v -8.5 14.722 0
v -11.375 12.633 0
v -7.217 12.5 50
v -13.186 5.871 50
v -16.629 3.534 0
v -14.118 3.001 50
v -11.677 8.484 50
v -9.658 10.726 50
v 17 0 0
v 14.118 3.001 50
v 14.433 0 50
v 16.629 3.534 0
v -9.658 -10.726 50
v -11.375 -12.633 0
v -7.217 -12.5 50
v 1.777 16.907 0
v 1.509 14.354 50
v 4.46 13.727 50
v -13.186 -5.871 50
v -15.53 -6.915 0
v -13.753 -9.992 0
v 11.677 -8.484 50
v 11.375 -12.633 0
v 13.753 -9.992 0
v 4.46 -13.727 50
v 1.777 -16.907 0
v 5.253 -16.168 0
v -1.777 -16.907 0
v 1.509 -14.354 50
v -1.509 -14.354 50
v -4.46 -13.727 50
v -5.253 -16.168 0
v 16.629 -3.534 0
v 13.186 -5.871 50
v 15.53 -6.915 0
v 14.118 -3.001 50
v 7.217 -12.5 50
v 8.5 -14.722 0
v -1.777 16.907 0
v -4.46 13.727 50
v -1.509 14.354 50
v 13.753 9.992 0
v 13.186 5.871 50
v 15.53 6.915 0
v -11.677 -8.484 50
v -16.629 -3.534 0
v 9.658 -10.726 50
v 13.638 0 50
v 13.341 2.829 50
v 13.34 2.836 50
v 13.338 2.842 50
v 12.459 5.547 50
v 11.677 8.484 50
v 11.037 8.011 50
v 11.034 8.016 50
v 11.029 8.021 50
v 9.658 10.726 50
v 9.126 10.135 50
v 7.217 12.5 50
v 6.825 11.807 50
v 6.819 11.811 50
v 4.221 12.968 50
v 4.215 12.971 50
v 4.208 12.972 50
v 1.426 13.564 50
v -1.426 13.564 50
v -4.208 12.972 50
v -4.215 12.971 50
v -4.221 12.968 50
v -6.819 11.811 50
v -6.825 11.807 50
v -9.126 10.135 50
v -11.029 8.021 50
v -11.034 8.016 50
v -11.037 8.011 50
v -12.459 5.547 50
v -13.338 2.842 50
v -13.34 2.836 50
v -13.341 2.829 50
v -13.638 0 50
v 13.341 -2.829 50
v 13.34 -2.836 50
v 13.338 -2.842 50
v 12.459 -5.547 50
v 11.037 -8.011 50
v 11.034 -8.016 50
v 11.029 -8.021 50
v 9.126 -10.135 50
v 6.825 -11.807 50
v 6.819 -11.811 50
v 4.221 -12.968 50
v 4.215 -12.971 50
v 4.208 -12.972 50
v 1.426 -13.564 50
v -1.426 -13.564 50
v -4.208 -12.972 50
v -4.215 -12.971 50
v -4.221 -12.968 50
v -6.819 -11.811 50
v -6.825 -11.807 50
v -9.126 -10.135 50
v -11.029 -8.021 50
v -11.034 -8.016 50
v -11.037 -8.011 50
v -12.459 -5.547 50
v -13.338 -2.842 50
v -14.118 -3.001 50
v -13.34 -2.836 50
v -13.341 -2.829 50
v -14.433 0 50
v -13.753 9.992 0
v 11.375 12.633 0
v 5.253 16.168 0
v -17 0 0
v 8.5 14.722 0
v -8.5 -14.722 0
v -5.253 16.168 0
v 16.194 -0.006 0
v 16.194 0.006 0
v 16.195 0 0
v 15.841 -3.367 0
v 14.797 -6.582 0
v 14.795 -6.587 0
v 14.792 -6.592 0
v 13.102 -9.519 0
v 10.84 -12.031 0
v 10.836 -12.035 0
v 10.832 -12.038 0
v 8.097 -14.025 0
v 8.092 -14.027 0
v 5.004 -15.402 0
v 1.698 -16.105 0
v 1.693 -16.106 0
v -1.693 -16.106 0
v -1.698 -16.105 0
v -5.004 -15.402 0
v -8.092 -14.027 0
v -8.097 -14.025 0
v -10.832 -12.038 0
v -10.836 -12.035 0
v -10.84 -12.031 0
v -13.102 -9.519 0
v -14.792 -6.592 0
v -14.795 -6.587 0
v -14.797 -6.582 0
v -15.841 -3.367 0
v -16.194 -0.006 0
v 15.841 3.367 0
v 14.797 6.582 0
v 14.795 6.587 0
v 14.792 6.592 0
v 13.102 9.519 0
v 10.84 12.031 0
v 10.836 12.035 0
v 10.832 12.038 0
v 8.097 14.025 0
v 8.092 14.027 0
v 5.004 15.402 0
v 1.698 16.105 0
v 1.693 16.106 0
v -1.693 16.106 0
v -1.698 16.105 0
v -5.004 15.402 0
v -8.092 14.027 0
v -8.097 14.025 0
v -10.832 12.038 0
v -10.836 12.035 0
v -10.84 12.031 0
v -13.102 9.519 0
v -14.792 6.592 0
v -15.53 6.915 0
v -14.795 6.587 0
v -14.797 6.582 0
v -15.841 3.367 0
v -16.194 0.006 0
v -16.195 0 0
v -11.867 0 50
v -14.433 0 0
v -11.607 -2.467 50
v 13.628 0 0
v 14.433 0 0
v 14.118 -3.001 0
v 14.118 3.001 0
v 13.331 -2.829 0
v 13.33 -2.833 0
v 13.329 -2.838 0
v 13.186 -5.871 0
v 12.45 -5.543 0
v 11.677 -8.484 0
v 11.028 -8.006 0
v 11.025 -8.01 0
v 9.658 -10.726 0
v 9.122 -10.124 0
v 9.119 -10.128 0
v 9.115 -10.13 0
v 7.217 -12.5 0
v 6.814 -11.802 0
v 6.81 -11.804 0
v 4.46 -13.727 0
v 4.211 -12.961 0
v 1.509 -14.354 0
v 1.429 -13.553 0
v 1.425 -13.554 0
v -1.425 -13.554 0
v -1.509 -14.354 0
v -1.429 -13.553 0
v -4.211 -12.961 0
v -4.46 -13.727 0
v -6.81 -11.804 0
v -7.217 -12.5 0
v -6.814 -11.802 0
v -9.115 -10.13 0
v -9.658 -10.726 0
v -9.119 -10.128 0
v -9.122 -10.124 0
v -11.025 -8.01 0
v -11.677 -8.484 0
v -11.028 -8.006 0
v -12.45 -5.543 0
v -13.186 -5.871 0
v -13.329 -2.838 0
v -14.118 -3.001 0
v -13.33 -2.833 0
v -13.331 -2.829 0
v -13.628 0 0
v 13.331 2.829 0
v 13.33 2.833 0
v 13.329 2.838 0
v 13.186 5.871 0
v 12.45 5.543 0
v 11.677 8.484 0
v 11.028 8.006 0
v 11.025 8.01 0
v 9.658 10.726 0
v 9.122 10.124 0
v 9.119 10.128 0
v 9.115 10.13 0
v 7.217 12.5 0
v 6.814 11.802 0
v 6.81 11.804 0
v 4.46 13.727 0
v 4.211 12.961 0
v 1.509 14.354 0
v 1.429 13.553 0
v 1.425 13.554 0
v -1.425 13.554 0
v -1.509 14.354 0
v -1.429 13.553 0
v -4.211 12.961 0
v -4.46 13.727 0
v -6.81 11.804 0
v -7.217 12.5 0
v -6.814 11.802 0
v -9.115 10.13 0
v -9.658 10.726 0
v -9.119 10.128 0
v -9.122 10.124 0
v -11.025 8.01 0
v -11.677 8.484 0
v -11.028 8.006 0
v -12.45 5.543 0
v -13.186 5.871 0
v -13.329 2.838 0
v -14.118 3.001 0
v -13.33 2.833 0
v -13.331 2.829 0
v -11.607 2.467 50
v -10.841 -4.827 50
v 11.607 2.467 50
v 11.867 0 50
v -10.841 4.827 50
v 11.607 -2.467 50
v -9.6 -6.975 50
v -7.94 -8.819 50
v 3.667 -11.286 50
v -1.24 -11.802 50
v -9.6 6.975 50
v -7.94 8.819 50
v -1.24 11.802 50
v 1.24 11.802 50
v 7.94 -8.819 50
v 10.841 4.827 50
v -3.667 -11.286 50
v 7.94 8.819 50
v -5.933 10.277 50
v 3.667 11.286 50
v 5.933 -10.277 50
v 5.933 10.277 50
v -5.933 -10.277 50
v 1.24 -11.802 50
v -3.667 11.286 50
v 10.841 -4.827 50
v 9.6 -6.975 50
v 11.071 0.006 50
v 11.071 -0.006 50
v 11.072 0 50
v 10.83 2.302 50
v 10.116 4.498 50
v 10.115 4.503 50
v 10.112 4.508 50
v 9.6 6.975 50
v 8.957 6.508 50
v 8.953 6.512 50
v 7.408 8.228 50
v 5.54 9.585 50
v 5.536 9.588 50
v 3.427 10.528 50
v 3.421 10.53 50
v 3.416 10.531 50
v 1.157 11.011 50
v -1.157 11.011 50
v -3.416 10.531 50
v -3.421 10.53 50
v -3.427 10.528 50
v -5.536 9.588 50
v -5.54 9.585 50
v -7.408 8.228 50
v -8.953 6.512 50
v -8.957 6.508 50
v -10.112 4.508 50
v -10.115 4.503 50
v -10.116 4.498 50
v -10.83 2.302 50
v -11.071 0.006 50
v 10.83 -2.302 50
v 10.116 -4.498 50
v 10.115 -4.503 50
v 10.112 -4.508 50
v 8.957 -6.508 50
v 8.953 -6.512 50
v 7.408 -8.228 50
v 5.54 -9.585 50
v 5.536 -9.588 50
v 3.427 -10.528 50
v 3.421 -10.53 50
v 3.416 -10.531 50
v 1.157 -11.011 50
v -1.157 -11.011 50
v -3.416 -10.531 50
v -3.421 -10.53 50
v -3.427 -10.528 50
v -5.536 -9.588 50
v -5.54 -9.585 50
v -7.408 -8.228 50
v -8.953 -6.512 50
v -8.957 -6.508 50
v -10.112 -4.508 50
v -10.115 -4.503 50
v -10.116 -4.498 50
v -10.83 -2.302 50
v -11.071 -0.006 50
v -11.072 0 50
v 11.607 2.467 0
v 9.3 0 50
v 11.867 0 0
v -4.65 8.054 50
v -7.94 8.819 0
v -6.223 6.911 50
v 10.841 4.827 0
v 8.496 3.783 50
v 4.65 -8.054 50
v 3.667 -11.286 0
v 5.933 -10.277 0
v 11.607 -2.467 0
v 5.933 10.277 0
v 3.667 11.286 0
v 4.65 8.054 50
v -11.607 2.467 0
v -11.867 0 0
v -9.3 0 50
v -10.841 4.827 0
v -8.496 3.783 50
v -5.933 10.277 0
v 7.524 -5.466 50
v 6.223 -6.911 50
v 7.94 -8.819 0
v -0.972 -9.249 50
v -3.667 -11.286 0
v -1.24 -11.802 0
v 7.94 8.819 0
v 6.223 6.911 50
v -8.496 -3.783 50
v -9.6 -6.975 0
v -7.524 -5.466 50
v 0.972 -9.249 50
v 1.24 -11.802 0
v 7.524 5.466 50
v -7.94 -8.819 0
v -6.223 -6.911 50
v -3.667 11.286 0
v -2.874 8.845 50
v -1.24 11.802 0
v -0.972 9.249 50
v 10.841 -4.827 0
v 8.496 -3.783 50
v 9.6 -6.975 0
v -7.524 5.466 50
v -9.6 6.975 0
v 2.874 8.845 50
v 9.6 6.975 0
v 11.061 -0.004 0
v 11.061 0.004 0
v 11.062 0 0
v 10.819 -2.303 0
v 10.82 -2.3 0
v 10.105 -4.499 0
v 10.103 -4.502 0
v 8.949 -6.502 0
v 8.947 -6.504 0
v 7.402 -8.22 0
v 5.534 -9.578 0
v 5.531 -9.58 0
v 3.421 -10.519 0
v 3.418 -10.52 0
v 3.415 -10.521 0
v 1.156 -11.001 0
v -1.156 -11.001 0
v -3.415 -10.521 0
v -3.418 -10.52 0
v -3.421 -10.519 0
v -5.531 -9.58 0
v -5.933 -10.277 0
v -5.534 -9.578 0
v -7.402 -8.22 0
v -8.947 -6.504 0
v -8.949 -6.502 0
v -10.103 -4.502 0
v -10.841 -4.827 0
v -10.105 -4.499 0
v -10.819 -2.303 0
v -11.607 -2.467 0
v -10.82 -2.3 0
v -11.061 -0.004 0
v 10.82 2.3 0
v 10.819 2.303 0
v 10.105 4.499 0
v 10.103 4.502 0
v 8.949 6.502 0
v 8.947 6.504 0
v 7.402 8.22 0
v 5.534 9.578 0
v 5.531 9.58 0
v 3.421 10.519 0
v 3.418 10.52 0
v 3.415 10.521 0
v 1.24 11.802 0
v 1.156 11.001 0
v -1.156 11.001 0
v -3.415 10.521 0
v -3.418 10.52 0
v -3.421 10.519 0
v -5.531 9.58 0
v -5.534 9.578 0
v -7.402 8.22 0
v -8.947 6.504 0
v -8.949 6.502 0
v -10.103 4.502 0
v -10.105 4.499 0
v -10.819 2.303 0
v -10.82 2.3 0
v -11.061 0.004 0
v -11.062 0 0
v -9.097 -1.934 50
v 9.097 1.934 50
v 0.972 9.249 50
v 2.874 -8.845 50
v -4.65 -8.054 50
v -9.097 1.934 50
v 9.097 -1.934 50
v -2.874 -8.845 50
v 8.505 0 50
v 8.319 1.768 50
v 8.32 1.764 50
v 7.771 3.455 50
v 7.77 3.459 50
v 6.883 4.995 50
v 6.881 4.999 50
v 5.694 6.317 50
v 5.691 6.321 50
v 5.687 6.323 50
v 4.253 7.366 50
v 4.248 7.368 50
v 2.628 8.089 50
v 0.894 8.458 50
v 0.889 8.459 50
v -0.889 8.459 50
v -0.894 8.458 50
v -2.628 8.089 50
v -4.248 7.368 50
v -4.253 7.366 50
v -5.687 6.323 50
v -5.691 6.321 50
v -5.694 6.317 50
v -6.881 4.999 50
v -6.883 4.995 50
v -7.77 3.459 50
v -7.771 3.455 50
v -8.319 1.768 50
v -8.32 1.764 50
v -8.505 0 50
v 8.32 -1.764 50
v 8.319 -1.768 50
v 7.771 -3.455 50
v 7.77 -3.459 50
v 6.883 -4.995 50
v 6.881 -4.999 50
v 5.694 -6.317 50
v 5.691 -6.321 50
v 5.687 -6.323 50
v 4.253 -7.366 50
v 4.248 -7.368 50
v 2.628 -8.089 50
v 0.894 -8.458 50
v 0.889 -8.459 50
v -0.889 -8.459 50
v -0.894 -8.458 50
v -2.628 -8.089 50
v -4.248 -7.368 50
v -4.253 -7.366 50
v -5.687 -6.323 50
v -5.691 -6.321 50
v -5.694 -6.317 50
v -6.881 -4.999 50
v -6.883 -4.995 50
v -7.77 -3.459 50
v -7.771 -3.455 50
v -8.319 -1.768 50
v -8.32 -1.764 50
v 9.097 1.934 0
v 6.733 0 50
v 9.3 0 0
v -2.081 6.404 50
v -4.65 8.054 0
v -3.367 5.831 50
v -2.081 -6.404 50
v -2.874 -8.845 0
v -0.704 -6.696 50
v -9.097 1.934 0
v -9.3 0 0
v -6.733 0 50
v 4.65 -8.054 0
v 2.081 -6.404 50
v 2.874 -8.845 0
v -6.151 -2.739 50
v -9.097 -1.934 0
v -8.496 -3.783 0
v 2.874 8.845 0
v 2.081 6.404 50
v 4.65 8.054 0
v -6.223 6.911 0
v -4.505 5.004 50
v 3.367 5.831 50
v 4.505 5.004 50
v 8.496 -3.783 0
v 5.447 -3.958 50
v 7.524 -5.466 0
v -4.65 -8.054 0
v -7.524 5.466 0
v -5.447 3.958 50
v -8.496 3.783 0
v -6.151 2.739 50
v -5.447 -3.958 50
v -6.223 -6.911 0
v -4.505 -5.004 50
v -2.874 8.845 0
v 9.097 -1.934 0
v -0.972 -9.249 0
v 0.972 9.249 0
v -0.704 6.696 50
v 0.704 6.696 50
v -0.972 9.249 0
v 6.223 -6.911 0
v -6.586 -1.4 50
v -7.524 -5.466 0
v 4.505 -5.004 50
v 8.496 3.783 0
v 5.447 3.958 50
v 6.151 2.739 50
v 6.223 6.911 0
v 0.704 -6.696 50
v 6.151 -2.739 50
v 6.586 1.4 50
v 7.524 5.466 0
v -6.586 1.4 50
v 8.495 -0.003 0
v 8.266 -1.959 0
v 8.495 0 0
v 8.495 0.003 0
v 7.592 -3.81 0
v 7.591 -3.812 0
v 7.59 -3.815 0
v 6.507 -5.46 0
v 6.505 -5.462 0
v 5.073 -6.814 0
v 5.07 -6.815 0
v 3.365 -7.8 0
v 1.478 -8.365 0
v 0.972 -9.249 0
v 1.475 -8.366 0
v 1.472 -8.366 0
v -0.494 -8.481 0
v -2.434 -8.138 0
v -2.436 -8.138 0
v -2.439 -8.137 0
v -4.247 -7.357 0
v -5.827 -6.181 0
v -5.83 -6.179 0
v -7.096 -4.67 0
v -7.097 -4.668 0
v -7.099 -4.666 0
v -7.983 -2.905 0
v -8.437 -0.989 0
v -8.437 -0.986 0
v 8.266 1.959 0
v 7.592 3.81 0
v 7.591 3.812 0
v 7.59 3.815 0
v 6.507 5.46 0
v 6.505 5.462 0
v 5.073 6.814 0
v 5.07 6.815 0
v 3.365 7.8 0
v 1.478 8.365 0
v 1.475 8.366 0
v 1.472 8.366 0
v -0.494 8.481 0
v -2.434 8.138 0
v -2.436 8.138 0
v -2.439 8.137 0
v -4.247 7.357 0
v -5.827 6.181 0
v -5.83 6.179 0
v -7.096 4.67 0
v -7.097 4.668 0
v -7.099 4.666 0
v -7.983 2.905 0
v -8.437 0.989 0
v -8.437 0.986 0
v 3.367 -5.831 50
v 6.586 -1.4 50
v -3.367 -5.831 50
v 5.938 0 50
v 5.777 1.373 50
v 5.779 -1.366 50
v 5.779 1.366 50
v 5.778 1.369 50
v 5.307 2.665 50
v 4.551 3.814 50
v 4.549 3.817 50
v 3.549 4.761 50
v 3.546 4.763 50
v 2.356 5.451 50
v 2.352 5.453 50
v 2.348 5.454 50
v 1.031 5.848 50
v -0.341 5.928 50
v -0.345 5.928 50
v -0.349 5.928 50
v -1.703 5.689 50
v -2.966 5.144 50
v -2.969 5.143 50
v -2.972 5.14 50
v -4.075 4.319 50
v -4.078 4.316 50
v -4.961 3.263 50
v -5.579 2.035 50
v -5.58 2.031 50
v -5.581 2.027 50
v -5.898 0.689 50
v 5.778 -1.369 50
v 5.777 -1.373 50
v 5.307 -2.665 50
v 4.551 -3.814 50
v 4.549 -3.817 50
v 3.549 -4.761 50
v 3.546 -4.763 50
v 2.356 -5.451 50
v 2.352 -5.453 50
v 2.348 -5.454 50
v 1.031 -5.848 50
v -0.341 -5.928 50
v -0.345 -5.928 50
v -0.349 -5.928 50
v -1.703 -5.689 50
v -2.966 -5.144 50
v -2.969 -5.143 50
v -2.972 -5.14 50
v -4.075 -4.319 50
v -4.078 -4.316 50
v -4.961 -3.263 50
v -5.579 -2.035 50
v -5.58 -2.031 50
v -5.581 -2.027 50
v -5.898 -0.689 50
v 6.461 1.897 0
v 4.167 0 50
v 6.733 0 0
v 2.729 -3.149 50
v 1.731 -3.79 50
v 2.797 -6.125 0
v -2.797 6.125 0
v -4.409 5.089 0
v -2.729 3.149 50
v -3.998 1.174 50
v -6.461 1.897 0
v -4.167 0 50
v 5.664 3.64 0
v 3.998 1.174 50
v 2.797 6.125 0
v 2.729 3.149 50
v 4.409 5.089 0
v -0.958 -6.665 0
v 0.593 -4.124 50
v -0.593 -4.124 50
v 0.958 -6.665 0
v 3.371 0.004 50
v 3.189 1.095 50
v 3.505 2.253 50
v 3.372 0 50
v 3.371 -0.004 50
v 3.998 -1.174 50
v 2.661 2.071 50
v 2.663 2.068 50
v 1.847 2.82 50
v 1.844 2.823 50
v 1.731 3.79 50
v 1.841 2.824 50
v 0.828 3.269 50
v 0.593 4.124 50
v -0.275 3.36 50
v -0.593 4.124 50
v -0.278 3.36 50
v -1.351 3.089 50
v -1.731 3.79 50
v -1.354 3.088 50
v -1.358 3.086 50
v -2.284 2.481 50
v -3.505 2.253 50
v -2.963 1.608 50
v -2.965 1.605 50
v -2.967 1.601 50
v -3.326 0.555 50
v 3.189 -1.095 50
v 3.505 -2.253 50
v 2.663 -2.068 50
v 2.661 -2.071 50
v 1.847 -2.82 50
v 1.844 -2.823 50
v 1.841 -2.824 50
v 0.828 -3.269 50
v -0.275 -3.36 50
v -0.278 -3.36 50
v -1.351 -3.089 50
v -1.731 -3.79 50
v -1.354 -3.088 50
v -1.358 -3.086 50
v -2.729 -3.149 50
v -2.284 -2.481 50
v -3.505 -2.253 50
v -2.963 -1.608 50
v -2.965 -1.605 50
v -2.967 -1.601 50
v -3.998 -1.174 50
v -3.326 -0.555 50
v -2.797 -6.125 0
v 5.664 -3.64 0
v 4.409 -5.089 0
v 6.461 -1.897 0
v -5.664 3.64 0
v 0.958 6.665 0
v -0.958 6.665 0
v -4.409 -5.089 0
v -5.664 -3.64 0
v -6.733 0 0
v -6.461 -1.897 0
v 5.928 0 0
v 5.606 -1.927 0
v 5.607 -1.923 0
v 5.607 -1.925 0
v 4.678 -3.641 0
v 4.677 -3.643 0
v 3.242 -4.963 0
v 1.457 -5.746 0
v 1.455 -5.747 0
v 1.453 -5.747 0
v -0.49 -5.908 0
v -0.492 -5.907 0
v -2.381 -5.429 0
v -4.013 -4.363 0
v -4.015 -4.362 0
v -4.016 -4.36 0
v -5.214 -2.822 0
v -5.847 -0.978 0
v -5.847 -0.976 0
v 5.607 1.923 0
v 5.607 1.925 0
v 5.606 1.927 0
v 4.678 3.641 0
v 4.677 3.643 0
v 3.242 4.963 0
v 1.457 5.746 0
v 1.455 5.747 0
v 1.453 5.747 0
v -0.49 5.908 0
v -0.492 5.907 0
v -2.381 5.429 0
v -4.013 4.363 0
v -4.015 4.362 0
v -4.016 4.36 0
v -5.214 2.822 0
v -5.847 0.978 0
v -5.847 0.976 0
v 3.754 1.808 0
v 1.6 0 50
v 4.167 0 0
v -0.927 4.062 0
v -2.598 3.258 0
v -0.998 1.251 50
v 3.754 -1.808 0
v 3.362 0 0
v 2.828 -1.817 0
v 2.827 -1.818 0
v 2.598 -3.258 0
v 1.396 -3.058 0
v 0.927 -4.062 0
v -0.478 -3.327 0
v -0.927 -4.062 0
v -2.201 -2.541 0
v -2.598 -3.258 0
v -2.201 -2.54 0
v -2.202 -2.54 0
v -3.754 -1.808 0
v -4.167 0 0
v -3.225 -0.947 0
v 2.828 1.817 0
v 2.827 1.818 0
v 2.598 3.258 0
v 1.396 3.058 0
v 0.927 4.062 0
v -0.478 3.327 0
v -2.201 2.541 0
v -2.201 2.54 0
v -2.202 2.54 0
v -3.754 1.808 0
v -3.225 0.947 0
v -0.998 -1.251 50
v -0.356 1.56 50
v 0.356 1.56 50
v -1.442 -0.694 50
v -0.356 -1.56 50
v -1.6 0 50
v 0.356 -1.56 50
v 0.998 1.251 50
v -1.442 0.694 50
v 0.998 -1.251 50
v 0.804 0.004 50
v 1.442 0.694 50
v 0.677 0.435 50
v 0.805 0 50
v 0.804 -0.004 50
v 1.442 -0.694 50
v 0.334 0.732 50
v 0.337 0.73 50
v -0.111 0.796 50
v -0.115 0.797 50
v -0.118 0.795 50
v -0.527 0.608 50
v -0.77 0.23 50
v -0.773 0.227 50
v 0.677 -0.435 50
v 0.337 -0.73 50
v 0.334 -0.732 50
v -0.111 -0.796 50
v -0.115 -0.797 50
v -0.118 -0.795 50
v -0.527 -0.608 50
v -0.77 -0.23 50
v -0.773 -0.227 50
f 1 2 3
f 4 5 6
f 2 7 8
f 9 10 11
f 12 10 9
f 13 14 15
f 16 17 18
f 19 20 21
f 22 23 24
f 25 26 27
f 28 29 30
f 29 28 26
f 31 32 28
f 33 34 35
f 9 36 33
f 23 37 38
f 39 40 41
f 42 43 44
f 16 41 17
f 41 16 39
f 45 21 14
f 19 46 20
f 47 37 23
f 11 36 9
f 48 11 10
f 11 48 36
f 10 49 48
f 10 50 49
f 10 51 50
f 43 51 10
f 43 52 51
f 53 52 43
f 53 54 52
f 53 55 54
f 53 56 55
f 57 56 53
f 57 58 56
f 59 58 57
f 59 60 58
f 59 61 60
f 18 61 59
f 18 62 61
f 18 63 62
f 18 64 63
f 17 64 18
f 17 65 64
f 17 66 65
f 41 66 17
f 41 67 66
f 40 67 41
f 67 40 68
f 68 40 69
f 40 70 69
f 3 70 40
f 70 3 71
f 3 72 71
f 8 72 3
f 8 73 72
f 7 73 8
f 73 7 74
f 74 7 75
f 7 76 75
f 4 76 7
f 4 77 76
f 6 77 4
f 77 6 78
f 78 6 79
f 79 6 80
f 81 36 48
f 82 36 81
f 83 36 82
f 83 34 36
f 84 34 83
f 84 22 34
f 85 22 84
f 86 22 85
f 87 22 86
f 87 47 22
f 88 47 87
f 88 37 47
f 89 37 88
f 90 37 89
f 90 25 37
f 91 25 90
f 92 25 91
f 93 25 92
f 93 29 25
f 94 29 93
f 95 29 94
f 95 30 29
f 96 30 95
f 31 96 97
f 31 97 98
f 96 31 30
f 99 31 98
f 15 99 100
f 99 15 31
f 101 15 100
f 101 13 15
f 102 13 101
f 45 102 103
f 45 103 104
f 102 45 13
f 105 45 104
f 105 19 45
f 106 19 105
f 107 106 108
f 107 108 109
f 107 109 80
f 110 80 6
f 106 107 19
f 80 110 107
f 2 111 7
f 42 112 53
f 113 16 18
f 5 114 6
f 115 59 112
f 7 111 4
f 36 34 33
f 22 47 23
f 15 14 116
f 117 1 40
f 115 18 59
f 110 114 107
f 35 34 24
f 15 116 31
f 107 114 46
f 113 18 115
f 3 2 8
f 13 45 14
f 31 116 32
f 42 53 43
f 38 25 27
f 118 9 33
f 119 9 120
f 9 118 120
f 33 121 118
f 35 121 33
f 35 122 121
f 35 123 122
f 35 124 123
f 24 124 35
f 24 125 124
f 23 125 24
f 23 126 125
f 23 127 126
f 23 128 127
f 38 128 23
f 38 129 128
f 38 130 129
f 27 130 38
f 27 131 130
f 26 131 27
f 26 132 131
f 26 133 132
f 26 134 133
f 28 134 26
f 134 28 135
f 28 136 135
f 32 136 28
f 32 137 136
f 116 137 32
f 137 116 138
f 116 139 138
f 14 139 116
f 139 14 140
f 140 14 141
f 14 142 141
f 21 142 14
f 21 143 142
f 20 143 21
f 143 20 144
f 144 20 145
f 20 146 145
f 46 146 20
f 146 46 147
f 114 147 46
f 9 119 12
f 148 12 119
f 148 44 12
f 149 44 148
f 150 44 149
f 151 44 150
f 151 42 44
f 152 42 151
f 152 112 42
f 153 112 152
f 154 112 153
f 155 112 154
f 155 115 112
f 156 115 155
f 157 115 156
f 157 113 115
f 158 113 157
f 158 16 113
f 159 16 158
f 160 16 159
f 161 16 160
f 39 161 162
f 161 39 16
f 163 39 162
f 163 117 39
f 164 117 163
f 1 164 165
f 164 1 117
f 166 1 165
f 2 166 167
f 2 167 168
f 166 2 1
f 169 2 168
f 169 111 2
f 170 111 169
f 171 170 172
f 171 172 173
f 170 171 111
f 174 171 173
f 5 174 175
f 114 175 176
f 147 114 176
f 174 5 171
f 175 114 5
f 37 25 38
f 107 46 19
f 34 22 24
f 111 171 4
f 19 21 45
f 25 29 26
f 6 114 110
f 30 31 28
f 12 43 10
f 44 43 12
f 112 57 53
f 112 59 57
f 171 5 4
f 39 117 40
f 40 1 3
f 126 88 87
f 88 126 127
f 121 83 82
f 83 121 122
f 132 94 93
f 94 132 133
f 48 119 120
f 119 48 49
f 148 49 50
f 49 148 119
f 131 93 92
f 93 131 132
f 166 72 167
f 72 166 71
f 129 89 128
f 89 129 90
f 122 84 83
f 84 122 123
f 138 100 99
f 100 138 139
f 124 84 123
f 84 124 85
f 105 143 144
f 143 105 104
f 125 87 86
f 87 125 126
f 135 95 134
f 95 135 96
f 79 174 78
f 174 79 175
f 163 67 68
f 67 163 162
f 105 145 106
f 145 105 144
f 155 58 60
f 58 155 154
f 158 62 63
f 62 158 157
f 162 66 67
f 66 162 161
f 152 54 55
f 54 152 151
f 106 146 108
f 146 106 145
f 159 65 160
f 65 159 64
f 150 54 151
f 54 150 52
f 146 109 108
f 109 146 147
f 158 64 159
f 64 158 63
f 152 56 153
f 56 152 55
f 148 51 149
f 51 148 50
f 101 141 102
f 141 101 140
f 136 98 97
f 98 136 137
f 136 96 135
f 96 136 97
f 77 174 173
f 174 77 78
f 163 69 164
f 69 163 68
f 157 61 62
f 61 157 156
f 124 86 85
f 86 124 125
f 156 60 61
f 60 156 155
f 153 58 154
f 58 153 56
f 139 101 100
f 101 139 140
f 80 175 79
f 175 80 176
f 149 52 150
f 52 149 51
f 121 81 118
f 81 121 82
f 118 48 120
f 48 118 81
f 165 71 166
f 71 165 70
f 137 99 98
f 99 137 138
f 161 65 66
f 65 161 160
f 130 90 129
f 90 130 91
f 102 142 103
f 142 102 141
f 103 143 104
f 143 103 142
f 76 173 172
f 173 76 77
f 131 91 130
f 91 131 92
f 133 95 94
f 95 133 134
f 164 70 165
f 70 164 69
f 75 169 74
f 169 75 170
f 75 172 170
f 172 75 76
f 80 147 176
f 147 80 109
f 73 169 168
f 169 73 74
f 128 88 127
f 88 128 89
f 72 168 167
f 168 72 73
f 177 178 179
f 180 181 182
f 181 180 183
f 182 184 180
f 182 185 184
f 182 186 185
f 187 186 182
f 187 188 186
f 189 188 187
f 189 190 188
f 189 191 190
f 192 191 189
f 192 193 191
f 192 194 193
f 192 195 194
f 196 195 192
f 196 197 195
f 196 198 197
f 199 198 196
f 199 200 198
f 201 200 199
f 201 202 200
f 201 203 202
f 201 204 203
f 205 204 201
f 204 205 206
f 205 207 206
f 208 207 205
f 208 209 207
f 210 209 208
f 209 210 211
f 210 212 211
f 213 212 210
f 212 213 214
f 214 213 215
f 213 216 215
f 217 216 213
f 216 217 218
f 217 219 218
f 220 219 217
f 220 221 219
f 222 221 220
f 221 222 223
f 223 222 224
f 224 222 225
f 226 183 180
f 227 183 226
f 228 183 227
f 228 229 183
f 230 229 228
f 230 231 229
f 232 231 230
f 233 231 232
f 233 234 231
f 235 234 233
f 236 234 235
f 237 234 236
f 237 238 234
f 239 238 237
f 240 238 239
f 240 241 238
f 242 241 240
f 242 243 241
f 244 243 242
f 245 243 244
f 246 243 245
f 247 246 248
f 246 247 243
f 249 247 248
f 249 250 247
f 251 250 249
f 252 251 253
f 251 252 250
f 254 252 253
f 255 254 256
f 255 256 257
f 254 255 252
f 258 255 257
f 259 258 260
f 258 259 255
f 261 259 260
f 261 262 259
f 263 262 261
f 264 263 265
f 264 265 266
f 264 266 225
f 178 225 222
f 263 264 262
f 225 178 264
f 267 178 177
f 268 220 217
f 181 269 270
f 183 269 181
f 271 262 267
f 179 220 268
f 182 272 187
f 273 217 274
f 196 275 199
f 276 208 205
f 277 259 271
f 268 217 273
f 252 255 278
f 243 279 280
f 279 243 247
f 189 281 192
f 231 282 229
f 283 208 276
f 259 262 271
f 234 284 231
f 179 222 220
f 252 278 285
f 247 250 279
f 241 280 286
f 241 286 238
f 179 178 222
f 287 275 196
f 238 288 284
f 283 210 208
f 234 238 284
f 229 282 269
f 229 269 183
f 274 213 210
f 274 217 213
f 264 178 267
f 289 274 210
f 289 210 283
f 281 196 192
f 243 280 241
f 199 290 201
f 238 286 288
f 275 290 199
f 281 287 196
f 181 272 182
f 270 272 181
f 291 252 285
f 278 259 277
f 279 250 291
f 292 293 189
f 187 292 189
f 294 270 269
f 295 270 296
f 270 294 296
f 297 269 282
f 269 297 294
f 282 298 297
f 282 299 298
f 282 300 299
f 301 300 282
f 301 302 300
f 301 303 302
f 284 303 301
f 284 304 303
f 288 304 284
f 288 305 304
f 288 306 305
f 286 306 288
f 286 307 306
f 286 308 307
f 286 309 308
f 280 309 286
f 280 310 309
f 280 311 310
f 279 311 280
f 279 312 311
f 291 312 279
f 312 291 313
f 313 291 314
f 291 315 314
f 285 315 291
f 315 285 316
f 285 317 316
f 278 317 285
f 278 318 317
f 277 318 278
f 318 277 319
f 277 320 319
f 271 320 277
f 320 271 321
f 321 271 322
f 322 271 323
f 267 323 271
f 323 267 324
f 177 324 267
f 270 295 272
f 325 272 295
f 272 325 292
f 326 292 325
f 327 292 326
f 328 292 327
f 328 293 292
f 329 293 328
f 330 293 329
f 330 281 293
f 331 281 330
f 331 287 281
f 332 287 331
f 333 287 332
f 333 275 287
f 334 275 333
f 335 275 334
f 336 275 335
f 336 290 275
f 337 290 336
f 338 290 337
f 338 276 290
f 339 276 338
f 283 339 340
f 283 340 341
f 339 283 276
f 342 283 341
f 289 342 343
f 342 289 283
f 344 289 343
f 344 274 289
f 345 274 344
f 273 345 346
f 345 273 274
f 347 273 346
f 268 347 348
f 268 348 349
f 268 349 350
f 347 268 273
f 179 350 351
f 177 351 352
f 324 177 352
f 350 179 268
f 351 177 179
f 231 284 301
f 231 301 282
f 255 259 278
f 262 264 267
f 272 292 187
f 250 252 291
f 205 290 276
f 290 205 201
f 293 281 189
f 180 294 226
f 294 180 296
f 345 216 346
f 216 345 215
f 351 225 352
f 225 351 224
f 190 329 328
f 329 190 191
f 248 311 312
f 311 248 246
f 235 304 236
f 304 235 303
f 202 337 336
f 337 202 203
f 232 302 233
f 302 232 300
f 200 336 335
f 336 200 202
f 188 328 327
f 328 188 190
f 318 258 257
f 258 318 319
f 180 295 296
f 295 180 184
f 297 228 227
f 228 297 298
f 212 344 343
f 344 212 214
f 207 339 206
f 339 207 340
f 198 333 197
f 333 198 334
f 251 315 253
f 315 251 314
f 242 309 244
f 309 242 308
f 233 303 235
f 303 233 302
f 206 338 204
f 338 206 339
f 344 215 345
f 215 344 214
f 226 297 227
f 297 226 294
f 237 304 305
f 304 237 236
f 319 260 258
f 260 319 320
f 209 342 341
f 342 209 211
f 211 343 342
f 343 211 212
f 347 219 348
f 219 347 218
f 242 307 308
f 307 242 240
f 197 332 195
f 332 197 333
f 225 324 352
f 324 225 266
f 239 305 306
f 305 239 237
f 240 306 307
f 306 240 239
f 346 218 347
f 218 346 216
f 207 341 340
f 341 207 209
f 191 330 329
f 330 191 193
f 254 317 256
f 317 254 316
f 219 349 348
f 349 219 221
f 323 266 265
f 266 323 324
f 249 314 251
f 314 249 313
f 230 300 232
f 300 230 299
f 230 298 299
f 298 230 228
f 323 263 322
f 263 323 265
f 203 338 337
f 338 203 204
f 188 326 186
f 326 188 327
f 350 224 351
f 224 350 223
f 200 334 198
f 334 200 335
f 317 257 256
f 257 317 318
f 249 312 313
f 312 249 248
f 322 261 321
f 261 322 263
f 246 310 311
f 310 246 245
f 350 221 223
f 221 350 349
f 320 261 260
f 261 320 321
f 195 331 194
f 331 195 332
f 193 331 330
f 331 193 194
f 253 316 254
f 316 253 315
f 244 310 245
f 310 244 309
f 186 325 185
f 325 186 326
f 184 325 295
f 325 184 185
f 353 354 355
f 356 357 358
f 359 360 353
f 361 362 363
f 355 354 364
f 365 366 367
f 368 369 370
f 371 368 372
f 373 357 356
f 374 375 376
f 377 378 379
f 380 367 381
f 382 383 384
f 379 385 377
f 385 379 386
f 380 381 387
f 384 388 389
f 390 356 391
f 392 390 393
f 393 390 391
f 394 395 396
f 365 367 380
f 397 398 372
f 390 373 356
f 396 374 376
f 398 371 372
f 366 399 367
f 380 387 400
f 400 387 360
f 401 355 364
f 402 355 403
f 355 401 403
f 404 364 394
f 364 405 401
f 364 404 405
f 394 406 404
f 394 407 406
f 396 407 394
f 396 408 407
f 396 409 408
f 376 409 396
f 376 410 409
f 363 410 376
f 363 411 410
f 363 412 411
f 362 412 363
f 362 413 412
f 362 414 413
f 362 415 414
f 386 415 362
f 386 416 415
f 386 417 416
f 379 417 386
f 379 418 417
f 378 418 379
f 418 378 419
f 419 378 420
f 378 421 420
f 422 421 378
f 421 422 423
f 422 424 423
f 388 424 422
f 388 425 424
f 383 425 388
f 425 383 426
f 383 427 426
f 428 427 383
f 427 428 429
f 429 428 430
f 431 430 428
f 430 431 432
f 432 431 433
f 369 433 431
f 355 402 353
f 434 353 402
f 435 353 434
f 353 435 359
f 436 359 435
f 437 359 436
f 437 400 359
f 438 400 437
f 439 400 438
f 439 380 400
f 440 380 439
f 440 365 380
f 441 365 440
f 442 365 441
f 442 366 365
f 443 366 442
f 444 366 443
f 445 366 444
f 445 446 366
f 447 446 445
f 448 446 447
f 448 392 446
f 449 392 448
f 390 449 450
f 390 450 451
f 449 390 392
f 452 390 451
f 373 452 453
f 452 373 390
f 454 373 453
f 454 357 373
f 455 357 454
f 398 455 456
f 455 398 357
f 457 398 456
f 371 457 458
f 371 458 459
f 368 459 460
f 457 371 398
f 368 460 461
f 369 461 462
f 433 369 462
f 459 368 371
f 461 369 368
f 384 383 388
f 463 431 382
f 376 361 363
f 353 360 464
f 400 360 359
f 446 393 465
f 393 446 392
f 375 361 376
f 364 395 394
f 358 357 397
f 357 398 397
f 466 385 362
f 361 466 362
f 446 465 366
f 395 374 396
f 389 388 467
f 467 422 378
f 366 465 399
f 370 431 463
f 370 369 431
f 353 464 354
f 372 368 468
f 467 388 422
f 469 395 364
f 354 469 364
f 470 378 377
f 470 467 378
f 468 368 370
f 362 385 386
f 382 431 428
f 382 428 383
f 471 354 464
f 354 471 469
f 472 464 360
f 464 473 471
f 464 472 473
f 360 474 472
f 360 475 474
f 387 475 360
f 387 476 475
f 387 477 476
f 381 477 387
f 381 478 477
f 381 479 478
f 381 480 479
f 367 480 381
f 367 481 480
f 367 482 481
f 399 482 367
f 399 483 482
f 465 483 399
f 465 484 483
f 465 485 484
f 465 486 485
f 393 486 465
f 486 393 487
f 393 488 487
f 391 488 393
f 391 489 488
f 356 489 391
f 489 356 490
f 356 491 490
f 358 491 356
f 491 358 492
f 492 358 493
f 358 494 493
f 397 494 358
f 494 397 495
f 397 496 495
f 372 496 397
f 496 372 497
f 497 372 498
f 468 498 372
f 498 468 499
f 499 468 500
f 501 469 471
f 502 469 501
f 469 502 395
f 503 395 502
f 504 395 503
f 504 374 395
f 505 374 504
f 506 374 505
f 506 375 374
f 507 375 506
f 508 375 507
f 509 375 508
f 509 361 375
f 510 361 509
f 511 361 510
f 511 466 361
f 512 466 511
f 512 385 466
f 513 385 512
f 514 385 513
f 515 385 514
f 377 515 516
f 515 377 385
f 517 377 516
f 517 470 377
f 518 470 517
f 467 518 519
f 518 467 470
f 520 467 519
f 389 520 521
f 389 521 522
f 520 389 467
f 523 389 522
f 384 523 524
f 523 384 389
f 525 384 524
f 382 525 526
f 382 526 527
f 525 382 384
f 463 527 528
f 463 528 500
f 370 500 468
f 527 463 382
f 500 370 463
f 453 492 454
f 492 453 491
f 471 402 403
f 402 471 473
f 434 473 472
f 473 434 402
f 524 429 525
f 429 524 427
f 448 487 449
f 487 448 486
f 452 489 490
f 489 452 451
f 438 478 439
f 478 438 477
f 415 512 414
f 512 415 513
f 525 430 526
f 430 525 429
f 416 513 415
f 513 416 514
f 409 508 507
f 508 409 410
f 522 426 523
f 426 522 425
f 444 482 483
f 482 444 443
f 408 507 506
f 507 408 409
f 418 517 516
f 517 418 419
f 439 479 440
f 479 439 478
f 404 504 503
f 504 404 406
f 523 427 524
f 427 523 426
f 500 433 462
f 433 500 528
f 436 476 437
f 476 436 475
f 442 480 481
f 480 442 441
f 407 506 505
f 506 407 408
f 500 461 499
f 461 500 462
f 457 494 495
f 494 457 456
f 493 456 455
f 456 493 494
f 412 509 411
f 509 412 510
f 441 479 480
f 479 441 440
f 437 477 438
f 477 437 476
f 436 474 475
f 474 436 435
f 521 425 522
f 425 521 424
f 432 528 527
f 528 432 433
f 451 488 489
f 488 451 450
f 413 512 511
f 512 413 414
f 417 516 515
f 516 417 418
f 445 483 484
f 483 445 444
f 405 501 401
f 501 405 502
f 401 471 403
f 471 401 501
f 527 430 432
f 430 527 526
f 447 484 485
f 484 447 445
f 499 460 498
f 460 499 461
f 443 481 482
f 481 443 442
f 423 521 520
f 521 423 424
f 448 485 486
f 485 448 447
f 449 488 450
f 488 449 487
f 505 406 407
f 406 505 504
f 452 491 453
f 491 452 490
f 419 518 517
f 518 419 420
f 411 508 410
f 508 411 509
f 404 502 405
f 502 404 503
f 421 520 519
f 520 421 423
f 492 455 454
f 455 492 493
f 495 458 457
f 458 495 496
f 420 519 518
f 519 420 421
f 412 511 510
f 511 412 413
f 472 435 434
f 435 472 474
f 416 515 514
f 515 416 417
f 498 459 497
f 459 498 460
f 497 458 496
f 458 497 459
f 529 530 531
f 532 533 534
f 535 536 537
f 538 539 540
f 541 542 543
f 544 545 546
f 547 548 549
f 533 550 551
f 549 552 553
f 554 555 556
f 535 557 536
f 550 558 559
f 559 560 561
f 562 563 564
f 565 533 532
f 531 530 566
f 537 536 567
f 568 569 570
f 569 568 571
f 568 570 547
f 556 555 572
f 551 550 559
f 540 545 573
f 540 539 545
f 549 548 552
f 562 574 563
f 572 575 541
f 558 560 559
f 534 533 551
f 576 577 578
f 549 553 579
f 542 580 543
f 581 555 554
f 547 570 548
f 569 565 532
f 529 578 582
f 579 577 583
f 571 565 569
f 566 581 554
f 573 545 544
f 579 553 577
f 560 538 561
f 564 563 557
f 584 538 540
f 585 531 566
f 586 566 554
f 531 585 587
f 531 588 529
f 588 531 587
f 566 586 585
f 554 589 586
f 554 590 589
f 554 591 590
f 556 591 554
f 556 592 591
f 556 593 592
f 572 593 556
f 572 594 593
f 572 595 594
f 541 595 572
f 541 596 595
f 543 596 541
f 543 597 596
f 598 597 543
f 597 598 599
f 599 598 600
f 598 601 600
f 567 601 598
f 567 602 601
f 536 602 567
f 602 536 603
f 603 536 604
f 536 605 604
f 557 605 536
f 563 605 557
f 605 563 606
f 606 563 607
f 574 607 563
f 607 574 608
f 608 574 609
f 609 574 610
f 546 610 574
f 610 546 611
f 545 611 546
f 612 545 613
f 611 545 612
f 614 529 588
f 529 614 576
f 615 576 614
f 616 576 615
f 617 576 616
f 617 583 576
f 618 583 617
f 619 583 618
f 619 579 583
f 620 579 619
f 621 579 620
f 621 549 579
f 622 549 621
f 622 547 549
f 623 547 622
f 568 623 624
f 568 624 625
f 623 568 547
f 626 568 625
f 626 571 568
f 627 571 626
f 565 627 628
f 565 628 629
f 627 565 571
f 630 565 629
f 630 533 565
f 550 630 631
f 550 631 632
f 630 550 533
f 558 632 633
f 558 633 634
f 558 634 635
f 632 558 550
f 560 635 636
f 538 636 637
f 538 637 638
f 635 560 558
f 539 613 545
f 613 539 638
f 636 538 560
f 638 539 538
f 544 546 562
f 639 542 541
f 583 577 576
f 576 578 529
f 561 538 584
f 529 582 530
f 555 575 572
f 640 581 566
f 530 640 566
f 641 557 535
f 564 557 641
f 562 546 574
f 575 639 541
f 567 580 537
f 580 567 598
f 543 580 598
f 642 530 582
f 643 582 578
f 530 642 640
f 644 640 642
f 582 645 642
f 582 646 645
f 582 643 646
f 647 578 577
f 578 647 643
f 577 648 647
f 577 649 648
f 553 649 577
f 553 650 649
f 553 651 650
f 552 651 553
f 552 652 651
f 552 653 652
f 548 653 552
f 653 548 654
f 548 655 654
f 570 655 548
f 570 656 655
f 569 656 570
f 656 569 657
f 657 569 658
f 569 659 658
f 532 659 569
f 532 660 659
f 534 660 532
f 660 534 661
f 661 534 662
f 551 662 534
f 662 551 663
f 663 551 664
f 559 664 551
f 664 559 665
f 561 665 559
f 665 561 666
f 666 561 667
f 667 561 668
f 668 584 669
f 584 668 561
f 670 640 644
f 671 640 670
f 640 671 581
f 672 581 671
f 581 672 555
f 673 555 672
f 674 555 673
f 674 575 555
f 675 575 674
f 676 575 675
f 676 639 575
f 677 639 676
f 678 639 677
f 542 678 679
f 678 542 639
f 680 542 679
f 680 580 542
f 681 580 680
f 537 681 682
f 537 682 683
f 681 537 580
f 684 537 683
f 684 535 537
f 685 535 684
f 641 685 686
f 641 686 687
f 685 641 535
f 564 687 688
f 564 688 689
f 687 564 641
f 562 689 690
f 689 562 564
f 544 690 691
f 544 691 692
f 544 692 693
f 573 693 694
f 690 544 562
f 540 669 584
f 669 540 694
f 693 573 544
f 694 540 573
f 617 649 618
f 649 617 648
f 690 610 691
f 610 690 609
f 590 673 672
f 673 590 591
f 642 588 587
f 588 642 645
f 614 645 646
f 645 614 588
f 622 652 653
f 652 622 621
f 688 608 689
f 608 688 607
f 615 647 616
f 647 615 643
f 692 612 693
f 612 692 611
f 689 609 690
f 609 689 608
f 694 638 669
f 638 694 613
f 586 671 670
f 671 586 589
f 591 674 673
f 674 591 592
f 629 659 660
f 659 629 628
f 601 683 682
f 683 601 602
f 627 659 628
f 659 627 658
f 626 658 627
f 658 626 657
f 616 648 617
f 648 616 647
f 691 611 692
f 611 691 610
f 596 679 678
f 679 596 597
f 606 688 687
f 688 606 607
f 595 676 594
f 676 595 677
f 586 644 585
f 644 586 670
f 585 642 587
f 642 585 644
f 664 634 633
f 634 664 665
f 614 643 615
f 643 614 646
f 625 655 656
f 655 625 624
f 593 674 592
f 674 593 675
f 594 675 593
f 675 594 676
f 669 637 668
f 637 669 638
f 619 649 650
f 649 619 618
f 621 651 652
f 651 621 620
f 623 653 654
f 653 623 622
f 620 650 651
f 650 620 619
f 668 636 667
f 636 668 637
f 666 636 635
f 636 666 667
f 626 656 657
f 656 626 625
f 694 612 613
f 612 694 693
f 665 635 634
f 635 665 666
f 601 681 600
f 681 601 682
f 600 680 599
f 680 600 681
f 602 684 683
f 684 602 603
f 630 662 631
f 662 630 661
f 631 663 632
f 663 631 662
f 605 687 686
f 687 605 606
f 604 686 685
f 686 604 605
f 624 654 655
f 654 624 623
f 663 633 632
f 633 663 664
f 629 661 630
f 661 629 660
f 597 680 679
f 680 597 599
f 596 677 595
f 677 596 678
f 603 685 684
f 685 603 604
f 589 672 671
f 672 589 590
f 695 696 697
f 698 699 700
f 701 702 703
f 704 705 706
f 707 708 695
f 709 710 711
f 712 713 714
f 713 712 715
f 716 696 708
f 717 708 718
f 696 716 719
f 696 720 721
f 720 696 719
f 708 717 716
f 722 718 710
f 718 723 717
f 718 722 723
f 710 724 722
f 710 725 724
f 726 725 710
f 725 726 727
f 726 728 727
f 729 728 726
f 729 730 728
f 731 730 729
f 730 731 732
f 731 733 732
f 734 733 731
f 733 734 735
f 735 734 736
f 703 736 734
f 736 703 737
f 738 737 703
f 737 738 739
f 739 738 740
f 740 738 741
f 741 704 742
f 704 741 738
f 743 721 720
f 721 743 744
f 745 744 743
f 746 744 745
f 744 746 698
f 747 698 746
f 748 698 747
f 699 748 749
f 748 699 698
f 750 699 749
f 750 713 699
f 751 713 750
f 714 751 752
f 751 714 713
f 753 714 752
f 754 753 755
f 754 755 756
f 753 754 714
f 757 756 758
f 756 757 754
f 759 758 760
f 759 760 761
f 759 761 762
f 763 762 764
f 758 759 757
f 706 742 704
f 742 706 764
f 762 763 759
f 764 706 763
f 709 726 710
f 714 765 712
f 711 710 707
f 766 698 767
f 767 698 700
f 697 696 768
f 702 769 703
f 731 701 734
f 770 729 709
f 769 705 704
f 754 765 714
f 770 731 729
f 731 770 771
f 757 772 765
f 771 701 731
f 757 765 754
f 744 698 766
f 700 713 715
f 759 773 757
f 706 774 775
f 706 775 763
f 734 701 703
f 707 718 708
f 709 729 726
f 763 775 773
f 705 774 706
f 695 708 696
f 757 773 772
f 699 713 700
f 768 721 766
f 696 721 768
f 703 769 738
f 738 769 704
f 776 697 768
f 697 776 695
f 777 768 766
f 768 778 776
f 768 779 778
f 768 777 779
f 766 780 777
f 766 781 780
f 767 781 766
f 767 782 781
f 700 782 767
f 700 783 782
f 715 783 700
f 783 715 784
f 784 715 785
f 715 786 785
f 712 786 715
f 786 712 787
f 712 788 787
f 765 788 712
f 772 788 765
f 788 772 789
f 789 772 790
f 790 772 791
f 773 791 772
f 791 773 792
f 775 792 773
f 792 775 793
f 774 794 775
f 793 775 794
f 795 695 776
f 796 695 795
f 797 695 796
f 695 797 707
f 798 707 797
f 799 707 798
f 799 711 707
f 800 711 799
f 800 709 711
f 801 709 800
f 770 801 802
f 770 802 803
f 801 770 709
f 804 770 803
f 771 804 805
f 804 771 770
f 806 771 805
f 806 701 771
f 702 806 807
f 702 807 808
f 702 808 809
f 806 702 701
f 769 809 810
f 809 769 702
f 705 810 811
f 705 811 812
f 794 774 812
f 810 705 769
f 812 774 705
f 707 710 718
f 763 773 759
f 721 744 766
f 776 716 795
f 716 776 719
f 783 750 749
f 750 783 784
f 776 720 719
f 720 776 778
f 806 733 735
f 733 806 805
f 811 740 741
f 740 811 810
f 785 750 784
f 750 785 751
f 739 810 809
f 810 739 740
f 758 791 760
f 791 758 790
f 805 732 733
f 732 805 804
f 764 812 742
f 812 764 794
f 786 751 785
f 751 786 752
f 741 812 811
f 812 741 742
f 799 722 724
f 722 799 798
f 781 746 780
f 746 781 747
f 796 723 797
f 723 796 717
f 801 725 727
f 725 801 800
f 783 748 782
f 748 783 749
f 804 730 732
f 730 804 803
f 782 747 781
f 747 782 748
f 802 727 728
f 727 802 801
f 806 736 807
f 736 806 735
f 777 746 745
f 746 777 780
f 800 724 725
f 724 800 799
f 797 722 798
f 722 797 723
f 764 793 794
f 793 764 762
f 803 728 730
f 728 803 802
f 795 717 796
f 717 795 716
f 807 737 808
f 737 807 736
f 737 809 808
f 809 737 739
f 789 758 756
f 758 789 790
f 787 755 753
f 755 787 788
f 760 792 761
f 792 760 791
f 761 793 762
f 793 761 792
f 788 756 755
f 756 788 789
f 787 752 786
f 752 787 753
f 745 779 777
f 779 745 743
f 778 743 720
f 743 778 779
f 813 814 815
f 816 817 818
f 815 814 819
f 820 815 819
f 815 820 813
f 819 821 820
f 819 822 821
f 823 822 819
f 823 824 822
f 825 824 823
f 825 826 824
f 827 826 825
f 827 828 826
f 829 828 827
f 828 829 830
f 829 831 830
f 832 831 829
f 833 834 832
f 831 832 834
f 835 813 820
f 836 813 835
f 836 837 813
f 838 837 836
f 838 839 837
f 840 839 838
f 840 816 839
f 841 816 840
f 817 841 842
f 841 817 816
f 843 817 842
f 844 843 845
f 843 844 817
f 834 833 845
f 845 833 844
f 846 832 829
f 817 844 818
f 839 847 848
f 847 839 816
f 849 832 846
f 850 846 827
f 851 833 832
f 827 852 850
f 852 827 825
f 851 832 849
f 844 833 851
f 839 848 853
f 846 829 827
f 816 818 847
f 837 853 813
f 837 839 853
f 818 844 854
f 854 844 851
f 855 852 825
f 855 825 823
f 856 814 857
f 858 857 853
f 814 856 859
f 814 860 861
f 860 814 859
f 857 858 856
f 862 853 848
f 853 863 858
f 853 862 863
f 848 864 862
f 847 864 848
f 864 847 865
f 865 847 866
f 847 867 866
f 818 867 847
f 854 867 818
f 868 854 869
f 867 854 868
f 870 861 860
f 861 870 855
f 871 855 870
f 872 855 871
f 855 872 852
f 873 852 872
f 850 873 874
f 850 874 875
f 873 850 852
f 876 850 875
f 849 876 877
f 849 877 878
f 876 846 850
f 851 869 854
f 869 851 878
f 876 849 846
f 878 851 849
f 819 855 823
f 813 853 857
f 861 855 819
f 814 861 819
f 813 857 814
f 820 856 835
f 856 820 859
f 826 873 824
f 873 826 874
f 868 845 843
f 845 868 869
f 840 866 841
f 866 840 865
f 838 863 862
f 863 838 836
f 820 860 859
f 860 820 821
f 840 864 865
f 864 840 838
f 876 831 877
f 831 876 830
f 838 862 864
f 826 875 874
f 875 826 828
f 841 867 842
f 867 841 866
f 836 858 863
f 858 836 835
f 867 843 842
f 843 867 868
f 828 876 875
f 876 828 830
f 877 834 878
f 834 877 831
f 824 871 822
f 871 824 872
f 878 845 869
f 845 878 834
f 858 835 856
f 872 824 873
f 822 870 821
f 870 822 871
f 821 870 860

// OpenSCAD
//shell thickness
ep		=0.8;  		
//seg height
hseg		= 50;		
//seg count
nseg		=6;			
//bottom radius
rb			= 17;		
//top radius
rt			= 1.6;			
//show ready to print (0) or extended (1)
deploie=0;
//hollow segment using csg (0) or create solid shape made hollow with cura (1)
nocsg=0;

rdelta = (rb - rt) /nseg;
pente = hseg / rdelta;
zz = ep * pente ;  //friction zone


echo(str("<h2>overlap:",zz,"mm<br>size when extended: " , nseg*hseg-(nseg-1)*zz , " mm</h2><br>"));

for (n=[0:nseg-1])
	{
		translate([0,0,deploie*n*(hseg-zz)]) 
		{
			difference()
				{
				cylinder(r1=rb-n*rdelta,r2=rb-(n+1)*rdelta,h=hseg);
				translate([500*nocsg,0,-0.1]) cylinder(r1=-ep+rb-n*rdelta,r2=-ep+rb-(n+1)*rdelta,h=hseg+0.2);
				}
		}
	}
